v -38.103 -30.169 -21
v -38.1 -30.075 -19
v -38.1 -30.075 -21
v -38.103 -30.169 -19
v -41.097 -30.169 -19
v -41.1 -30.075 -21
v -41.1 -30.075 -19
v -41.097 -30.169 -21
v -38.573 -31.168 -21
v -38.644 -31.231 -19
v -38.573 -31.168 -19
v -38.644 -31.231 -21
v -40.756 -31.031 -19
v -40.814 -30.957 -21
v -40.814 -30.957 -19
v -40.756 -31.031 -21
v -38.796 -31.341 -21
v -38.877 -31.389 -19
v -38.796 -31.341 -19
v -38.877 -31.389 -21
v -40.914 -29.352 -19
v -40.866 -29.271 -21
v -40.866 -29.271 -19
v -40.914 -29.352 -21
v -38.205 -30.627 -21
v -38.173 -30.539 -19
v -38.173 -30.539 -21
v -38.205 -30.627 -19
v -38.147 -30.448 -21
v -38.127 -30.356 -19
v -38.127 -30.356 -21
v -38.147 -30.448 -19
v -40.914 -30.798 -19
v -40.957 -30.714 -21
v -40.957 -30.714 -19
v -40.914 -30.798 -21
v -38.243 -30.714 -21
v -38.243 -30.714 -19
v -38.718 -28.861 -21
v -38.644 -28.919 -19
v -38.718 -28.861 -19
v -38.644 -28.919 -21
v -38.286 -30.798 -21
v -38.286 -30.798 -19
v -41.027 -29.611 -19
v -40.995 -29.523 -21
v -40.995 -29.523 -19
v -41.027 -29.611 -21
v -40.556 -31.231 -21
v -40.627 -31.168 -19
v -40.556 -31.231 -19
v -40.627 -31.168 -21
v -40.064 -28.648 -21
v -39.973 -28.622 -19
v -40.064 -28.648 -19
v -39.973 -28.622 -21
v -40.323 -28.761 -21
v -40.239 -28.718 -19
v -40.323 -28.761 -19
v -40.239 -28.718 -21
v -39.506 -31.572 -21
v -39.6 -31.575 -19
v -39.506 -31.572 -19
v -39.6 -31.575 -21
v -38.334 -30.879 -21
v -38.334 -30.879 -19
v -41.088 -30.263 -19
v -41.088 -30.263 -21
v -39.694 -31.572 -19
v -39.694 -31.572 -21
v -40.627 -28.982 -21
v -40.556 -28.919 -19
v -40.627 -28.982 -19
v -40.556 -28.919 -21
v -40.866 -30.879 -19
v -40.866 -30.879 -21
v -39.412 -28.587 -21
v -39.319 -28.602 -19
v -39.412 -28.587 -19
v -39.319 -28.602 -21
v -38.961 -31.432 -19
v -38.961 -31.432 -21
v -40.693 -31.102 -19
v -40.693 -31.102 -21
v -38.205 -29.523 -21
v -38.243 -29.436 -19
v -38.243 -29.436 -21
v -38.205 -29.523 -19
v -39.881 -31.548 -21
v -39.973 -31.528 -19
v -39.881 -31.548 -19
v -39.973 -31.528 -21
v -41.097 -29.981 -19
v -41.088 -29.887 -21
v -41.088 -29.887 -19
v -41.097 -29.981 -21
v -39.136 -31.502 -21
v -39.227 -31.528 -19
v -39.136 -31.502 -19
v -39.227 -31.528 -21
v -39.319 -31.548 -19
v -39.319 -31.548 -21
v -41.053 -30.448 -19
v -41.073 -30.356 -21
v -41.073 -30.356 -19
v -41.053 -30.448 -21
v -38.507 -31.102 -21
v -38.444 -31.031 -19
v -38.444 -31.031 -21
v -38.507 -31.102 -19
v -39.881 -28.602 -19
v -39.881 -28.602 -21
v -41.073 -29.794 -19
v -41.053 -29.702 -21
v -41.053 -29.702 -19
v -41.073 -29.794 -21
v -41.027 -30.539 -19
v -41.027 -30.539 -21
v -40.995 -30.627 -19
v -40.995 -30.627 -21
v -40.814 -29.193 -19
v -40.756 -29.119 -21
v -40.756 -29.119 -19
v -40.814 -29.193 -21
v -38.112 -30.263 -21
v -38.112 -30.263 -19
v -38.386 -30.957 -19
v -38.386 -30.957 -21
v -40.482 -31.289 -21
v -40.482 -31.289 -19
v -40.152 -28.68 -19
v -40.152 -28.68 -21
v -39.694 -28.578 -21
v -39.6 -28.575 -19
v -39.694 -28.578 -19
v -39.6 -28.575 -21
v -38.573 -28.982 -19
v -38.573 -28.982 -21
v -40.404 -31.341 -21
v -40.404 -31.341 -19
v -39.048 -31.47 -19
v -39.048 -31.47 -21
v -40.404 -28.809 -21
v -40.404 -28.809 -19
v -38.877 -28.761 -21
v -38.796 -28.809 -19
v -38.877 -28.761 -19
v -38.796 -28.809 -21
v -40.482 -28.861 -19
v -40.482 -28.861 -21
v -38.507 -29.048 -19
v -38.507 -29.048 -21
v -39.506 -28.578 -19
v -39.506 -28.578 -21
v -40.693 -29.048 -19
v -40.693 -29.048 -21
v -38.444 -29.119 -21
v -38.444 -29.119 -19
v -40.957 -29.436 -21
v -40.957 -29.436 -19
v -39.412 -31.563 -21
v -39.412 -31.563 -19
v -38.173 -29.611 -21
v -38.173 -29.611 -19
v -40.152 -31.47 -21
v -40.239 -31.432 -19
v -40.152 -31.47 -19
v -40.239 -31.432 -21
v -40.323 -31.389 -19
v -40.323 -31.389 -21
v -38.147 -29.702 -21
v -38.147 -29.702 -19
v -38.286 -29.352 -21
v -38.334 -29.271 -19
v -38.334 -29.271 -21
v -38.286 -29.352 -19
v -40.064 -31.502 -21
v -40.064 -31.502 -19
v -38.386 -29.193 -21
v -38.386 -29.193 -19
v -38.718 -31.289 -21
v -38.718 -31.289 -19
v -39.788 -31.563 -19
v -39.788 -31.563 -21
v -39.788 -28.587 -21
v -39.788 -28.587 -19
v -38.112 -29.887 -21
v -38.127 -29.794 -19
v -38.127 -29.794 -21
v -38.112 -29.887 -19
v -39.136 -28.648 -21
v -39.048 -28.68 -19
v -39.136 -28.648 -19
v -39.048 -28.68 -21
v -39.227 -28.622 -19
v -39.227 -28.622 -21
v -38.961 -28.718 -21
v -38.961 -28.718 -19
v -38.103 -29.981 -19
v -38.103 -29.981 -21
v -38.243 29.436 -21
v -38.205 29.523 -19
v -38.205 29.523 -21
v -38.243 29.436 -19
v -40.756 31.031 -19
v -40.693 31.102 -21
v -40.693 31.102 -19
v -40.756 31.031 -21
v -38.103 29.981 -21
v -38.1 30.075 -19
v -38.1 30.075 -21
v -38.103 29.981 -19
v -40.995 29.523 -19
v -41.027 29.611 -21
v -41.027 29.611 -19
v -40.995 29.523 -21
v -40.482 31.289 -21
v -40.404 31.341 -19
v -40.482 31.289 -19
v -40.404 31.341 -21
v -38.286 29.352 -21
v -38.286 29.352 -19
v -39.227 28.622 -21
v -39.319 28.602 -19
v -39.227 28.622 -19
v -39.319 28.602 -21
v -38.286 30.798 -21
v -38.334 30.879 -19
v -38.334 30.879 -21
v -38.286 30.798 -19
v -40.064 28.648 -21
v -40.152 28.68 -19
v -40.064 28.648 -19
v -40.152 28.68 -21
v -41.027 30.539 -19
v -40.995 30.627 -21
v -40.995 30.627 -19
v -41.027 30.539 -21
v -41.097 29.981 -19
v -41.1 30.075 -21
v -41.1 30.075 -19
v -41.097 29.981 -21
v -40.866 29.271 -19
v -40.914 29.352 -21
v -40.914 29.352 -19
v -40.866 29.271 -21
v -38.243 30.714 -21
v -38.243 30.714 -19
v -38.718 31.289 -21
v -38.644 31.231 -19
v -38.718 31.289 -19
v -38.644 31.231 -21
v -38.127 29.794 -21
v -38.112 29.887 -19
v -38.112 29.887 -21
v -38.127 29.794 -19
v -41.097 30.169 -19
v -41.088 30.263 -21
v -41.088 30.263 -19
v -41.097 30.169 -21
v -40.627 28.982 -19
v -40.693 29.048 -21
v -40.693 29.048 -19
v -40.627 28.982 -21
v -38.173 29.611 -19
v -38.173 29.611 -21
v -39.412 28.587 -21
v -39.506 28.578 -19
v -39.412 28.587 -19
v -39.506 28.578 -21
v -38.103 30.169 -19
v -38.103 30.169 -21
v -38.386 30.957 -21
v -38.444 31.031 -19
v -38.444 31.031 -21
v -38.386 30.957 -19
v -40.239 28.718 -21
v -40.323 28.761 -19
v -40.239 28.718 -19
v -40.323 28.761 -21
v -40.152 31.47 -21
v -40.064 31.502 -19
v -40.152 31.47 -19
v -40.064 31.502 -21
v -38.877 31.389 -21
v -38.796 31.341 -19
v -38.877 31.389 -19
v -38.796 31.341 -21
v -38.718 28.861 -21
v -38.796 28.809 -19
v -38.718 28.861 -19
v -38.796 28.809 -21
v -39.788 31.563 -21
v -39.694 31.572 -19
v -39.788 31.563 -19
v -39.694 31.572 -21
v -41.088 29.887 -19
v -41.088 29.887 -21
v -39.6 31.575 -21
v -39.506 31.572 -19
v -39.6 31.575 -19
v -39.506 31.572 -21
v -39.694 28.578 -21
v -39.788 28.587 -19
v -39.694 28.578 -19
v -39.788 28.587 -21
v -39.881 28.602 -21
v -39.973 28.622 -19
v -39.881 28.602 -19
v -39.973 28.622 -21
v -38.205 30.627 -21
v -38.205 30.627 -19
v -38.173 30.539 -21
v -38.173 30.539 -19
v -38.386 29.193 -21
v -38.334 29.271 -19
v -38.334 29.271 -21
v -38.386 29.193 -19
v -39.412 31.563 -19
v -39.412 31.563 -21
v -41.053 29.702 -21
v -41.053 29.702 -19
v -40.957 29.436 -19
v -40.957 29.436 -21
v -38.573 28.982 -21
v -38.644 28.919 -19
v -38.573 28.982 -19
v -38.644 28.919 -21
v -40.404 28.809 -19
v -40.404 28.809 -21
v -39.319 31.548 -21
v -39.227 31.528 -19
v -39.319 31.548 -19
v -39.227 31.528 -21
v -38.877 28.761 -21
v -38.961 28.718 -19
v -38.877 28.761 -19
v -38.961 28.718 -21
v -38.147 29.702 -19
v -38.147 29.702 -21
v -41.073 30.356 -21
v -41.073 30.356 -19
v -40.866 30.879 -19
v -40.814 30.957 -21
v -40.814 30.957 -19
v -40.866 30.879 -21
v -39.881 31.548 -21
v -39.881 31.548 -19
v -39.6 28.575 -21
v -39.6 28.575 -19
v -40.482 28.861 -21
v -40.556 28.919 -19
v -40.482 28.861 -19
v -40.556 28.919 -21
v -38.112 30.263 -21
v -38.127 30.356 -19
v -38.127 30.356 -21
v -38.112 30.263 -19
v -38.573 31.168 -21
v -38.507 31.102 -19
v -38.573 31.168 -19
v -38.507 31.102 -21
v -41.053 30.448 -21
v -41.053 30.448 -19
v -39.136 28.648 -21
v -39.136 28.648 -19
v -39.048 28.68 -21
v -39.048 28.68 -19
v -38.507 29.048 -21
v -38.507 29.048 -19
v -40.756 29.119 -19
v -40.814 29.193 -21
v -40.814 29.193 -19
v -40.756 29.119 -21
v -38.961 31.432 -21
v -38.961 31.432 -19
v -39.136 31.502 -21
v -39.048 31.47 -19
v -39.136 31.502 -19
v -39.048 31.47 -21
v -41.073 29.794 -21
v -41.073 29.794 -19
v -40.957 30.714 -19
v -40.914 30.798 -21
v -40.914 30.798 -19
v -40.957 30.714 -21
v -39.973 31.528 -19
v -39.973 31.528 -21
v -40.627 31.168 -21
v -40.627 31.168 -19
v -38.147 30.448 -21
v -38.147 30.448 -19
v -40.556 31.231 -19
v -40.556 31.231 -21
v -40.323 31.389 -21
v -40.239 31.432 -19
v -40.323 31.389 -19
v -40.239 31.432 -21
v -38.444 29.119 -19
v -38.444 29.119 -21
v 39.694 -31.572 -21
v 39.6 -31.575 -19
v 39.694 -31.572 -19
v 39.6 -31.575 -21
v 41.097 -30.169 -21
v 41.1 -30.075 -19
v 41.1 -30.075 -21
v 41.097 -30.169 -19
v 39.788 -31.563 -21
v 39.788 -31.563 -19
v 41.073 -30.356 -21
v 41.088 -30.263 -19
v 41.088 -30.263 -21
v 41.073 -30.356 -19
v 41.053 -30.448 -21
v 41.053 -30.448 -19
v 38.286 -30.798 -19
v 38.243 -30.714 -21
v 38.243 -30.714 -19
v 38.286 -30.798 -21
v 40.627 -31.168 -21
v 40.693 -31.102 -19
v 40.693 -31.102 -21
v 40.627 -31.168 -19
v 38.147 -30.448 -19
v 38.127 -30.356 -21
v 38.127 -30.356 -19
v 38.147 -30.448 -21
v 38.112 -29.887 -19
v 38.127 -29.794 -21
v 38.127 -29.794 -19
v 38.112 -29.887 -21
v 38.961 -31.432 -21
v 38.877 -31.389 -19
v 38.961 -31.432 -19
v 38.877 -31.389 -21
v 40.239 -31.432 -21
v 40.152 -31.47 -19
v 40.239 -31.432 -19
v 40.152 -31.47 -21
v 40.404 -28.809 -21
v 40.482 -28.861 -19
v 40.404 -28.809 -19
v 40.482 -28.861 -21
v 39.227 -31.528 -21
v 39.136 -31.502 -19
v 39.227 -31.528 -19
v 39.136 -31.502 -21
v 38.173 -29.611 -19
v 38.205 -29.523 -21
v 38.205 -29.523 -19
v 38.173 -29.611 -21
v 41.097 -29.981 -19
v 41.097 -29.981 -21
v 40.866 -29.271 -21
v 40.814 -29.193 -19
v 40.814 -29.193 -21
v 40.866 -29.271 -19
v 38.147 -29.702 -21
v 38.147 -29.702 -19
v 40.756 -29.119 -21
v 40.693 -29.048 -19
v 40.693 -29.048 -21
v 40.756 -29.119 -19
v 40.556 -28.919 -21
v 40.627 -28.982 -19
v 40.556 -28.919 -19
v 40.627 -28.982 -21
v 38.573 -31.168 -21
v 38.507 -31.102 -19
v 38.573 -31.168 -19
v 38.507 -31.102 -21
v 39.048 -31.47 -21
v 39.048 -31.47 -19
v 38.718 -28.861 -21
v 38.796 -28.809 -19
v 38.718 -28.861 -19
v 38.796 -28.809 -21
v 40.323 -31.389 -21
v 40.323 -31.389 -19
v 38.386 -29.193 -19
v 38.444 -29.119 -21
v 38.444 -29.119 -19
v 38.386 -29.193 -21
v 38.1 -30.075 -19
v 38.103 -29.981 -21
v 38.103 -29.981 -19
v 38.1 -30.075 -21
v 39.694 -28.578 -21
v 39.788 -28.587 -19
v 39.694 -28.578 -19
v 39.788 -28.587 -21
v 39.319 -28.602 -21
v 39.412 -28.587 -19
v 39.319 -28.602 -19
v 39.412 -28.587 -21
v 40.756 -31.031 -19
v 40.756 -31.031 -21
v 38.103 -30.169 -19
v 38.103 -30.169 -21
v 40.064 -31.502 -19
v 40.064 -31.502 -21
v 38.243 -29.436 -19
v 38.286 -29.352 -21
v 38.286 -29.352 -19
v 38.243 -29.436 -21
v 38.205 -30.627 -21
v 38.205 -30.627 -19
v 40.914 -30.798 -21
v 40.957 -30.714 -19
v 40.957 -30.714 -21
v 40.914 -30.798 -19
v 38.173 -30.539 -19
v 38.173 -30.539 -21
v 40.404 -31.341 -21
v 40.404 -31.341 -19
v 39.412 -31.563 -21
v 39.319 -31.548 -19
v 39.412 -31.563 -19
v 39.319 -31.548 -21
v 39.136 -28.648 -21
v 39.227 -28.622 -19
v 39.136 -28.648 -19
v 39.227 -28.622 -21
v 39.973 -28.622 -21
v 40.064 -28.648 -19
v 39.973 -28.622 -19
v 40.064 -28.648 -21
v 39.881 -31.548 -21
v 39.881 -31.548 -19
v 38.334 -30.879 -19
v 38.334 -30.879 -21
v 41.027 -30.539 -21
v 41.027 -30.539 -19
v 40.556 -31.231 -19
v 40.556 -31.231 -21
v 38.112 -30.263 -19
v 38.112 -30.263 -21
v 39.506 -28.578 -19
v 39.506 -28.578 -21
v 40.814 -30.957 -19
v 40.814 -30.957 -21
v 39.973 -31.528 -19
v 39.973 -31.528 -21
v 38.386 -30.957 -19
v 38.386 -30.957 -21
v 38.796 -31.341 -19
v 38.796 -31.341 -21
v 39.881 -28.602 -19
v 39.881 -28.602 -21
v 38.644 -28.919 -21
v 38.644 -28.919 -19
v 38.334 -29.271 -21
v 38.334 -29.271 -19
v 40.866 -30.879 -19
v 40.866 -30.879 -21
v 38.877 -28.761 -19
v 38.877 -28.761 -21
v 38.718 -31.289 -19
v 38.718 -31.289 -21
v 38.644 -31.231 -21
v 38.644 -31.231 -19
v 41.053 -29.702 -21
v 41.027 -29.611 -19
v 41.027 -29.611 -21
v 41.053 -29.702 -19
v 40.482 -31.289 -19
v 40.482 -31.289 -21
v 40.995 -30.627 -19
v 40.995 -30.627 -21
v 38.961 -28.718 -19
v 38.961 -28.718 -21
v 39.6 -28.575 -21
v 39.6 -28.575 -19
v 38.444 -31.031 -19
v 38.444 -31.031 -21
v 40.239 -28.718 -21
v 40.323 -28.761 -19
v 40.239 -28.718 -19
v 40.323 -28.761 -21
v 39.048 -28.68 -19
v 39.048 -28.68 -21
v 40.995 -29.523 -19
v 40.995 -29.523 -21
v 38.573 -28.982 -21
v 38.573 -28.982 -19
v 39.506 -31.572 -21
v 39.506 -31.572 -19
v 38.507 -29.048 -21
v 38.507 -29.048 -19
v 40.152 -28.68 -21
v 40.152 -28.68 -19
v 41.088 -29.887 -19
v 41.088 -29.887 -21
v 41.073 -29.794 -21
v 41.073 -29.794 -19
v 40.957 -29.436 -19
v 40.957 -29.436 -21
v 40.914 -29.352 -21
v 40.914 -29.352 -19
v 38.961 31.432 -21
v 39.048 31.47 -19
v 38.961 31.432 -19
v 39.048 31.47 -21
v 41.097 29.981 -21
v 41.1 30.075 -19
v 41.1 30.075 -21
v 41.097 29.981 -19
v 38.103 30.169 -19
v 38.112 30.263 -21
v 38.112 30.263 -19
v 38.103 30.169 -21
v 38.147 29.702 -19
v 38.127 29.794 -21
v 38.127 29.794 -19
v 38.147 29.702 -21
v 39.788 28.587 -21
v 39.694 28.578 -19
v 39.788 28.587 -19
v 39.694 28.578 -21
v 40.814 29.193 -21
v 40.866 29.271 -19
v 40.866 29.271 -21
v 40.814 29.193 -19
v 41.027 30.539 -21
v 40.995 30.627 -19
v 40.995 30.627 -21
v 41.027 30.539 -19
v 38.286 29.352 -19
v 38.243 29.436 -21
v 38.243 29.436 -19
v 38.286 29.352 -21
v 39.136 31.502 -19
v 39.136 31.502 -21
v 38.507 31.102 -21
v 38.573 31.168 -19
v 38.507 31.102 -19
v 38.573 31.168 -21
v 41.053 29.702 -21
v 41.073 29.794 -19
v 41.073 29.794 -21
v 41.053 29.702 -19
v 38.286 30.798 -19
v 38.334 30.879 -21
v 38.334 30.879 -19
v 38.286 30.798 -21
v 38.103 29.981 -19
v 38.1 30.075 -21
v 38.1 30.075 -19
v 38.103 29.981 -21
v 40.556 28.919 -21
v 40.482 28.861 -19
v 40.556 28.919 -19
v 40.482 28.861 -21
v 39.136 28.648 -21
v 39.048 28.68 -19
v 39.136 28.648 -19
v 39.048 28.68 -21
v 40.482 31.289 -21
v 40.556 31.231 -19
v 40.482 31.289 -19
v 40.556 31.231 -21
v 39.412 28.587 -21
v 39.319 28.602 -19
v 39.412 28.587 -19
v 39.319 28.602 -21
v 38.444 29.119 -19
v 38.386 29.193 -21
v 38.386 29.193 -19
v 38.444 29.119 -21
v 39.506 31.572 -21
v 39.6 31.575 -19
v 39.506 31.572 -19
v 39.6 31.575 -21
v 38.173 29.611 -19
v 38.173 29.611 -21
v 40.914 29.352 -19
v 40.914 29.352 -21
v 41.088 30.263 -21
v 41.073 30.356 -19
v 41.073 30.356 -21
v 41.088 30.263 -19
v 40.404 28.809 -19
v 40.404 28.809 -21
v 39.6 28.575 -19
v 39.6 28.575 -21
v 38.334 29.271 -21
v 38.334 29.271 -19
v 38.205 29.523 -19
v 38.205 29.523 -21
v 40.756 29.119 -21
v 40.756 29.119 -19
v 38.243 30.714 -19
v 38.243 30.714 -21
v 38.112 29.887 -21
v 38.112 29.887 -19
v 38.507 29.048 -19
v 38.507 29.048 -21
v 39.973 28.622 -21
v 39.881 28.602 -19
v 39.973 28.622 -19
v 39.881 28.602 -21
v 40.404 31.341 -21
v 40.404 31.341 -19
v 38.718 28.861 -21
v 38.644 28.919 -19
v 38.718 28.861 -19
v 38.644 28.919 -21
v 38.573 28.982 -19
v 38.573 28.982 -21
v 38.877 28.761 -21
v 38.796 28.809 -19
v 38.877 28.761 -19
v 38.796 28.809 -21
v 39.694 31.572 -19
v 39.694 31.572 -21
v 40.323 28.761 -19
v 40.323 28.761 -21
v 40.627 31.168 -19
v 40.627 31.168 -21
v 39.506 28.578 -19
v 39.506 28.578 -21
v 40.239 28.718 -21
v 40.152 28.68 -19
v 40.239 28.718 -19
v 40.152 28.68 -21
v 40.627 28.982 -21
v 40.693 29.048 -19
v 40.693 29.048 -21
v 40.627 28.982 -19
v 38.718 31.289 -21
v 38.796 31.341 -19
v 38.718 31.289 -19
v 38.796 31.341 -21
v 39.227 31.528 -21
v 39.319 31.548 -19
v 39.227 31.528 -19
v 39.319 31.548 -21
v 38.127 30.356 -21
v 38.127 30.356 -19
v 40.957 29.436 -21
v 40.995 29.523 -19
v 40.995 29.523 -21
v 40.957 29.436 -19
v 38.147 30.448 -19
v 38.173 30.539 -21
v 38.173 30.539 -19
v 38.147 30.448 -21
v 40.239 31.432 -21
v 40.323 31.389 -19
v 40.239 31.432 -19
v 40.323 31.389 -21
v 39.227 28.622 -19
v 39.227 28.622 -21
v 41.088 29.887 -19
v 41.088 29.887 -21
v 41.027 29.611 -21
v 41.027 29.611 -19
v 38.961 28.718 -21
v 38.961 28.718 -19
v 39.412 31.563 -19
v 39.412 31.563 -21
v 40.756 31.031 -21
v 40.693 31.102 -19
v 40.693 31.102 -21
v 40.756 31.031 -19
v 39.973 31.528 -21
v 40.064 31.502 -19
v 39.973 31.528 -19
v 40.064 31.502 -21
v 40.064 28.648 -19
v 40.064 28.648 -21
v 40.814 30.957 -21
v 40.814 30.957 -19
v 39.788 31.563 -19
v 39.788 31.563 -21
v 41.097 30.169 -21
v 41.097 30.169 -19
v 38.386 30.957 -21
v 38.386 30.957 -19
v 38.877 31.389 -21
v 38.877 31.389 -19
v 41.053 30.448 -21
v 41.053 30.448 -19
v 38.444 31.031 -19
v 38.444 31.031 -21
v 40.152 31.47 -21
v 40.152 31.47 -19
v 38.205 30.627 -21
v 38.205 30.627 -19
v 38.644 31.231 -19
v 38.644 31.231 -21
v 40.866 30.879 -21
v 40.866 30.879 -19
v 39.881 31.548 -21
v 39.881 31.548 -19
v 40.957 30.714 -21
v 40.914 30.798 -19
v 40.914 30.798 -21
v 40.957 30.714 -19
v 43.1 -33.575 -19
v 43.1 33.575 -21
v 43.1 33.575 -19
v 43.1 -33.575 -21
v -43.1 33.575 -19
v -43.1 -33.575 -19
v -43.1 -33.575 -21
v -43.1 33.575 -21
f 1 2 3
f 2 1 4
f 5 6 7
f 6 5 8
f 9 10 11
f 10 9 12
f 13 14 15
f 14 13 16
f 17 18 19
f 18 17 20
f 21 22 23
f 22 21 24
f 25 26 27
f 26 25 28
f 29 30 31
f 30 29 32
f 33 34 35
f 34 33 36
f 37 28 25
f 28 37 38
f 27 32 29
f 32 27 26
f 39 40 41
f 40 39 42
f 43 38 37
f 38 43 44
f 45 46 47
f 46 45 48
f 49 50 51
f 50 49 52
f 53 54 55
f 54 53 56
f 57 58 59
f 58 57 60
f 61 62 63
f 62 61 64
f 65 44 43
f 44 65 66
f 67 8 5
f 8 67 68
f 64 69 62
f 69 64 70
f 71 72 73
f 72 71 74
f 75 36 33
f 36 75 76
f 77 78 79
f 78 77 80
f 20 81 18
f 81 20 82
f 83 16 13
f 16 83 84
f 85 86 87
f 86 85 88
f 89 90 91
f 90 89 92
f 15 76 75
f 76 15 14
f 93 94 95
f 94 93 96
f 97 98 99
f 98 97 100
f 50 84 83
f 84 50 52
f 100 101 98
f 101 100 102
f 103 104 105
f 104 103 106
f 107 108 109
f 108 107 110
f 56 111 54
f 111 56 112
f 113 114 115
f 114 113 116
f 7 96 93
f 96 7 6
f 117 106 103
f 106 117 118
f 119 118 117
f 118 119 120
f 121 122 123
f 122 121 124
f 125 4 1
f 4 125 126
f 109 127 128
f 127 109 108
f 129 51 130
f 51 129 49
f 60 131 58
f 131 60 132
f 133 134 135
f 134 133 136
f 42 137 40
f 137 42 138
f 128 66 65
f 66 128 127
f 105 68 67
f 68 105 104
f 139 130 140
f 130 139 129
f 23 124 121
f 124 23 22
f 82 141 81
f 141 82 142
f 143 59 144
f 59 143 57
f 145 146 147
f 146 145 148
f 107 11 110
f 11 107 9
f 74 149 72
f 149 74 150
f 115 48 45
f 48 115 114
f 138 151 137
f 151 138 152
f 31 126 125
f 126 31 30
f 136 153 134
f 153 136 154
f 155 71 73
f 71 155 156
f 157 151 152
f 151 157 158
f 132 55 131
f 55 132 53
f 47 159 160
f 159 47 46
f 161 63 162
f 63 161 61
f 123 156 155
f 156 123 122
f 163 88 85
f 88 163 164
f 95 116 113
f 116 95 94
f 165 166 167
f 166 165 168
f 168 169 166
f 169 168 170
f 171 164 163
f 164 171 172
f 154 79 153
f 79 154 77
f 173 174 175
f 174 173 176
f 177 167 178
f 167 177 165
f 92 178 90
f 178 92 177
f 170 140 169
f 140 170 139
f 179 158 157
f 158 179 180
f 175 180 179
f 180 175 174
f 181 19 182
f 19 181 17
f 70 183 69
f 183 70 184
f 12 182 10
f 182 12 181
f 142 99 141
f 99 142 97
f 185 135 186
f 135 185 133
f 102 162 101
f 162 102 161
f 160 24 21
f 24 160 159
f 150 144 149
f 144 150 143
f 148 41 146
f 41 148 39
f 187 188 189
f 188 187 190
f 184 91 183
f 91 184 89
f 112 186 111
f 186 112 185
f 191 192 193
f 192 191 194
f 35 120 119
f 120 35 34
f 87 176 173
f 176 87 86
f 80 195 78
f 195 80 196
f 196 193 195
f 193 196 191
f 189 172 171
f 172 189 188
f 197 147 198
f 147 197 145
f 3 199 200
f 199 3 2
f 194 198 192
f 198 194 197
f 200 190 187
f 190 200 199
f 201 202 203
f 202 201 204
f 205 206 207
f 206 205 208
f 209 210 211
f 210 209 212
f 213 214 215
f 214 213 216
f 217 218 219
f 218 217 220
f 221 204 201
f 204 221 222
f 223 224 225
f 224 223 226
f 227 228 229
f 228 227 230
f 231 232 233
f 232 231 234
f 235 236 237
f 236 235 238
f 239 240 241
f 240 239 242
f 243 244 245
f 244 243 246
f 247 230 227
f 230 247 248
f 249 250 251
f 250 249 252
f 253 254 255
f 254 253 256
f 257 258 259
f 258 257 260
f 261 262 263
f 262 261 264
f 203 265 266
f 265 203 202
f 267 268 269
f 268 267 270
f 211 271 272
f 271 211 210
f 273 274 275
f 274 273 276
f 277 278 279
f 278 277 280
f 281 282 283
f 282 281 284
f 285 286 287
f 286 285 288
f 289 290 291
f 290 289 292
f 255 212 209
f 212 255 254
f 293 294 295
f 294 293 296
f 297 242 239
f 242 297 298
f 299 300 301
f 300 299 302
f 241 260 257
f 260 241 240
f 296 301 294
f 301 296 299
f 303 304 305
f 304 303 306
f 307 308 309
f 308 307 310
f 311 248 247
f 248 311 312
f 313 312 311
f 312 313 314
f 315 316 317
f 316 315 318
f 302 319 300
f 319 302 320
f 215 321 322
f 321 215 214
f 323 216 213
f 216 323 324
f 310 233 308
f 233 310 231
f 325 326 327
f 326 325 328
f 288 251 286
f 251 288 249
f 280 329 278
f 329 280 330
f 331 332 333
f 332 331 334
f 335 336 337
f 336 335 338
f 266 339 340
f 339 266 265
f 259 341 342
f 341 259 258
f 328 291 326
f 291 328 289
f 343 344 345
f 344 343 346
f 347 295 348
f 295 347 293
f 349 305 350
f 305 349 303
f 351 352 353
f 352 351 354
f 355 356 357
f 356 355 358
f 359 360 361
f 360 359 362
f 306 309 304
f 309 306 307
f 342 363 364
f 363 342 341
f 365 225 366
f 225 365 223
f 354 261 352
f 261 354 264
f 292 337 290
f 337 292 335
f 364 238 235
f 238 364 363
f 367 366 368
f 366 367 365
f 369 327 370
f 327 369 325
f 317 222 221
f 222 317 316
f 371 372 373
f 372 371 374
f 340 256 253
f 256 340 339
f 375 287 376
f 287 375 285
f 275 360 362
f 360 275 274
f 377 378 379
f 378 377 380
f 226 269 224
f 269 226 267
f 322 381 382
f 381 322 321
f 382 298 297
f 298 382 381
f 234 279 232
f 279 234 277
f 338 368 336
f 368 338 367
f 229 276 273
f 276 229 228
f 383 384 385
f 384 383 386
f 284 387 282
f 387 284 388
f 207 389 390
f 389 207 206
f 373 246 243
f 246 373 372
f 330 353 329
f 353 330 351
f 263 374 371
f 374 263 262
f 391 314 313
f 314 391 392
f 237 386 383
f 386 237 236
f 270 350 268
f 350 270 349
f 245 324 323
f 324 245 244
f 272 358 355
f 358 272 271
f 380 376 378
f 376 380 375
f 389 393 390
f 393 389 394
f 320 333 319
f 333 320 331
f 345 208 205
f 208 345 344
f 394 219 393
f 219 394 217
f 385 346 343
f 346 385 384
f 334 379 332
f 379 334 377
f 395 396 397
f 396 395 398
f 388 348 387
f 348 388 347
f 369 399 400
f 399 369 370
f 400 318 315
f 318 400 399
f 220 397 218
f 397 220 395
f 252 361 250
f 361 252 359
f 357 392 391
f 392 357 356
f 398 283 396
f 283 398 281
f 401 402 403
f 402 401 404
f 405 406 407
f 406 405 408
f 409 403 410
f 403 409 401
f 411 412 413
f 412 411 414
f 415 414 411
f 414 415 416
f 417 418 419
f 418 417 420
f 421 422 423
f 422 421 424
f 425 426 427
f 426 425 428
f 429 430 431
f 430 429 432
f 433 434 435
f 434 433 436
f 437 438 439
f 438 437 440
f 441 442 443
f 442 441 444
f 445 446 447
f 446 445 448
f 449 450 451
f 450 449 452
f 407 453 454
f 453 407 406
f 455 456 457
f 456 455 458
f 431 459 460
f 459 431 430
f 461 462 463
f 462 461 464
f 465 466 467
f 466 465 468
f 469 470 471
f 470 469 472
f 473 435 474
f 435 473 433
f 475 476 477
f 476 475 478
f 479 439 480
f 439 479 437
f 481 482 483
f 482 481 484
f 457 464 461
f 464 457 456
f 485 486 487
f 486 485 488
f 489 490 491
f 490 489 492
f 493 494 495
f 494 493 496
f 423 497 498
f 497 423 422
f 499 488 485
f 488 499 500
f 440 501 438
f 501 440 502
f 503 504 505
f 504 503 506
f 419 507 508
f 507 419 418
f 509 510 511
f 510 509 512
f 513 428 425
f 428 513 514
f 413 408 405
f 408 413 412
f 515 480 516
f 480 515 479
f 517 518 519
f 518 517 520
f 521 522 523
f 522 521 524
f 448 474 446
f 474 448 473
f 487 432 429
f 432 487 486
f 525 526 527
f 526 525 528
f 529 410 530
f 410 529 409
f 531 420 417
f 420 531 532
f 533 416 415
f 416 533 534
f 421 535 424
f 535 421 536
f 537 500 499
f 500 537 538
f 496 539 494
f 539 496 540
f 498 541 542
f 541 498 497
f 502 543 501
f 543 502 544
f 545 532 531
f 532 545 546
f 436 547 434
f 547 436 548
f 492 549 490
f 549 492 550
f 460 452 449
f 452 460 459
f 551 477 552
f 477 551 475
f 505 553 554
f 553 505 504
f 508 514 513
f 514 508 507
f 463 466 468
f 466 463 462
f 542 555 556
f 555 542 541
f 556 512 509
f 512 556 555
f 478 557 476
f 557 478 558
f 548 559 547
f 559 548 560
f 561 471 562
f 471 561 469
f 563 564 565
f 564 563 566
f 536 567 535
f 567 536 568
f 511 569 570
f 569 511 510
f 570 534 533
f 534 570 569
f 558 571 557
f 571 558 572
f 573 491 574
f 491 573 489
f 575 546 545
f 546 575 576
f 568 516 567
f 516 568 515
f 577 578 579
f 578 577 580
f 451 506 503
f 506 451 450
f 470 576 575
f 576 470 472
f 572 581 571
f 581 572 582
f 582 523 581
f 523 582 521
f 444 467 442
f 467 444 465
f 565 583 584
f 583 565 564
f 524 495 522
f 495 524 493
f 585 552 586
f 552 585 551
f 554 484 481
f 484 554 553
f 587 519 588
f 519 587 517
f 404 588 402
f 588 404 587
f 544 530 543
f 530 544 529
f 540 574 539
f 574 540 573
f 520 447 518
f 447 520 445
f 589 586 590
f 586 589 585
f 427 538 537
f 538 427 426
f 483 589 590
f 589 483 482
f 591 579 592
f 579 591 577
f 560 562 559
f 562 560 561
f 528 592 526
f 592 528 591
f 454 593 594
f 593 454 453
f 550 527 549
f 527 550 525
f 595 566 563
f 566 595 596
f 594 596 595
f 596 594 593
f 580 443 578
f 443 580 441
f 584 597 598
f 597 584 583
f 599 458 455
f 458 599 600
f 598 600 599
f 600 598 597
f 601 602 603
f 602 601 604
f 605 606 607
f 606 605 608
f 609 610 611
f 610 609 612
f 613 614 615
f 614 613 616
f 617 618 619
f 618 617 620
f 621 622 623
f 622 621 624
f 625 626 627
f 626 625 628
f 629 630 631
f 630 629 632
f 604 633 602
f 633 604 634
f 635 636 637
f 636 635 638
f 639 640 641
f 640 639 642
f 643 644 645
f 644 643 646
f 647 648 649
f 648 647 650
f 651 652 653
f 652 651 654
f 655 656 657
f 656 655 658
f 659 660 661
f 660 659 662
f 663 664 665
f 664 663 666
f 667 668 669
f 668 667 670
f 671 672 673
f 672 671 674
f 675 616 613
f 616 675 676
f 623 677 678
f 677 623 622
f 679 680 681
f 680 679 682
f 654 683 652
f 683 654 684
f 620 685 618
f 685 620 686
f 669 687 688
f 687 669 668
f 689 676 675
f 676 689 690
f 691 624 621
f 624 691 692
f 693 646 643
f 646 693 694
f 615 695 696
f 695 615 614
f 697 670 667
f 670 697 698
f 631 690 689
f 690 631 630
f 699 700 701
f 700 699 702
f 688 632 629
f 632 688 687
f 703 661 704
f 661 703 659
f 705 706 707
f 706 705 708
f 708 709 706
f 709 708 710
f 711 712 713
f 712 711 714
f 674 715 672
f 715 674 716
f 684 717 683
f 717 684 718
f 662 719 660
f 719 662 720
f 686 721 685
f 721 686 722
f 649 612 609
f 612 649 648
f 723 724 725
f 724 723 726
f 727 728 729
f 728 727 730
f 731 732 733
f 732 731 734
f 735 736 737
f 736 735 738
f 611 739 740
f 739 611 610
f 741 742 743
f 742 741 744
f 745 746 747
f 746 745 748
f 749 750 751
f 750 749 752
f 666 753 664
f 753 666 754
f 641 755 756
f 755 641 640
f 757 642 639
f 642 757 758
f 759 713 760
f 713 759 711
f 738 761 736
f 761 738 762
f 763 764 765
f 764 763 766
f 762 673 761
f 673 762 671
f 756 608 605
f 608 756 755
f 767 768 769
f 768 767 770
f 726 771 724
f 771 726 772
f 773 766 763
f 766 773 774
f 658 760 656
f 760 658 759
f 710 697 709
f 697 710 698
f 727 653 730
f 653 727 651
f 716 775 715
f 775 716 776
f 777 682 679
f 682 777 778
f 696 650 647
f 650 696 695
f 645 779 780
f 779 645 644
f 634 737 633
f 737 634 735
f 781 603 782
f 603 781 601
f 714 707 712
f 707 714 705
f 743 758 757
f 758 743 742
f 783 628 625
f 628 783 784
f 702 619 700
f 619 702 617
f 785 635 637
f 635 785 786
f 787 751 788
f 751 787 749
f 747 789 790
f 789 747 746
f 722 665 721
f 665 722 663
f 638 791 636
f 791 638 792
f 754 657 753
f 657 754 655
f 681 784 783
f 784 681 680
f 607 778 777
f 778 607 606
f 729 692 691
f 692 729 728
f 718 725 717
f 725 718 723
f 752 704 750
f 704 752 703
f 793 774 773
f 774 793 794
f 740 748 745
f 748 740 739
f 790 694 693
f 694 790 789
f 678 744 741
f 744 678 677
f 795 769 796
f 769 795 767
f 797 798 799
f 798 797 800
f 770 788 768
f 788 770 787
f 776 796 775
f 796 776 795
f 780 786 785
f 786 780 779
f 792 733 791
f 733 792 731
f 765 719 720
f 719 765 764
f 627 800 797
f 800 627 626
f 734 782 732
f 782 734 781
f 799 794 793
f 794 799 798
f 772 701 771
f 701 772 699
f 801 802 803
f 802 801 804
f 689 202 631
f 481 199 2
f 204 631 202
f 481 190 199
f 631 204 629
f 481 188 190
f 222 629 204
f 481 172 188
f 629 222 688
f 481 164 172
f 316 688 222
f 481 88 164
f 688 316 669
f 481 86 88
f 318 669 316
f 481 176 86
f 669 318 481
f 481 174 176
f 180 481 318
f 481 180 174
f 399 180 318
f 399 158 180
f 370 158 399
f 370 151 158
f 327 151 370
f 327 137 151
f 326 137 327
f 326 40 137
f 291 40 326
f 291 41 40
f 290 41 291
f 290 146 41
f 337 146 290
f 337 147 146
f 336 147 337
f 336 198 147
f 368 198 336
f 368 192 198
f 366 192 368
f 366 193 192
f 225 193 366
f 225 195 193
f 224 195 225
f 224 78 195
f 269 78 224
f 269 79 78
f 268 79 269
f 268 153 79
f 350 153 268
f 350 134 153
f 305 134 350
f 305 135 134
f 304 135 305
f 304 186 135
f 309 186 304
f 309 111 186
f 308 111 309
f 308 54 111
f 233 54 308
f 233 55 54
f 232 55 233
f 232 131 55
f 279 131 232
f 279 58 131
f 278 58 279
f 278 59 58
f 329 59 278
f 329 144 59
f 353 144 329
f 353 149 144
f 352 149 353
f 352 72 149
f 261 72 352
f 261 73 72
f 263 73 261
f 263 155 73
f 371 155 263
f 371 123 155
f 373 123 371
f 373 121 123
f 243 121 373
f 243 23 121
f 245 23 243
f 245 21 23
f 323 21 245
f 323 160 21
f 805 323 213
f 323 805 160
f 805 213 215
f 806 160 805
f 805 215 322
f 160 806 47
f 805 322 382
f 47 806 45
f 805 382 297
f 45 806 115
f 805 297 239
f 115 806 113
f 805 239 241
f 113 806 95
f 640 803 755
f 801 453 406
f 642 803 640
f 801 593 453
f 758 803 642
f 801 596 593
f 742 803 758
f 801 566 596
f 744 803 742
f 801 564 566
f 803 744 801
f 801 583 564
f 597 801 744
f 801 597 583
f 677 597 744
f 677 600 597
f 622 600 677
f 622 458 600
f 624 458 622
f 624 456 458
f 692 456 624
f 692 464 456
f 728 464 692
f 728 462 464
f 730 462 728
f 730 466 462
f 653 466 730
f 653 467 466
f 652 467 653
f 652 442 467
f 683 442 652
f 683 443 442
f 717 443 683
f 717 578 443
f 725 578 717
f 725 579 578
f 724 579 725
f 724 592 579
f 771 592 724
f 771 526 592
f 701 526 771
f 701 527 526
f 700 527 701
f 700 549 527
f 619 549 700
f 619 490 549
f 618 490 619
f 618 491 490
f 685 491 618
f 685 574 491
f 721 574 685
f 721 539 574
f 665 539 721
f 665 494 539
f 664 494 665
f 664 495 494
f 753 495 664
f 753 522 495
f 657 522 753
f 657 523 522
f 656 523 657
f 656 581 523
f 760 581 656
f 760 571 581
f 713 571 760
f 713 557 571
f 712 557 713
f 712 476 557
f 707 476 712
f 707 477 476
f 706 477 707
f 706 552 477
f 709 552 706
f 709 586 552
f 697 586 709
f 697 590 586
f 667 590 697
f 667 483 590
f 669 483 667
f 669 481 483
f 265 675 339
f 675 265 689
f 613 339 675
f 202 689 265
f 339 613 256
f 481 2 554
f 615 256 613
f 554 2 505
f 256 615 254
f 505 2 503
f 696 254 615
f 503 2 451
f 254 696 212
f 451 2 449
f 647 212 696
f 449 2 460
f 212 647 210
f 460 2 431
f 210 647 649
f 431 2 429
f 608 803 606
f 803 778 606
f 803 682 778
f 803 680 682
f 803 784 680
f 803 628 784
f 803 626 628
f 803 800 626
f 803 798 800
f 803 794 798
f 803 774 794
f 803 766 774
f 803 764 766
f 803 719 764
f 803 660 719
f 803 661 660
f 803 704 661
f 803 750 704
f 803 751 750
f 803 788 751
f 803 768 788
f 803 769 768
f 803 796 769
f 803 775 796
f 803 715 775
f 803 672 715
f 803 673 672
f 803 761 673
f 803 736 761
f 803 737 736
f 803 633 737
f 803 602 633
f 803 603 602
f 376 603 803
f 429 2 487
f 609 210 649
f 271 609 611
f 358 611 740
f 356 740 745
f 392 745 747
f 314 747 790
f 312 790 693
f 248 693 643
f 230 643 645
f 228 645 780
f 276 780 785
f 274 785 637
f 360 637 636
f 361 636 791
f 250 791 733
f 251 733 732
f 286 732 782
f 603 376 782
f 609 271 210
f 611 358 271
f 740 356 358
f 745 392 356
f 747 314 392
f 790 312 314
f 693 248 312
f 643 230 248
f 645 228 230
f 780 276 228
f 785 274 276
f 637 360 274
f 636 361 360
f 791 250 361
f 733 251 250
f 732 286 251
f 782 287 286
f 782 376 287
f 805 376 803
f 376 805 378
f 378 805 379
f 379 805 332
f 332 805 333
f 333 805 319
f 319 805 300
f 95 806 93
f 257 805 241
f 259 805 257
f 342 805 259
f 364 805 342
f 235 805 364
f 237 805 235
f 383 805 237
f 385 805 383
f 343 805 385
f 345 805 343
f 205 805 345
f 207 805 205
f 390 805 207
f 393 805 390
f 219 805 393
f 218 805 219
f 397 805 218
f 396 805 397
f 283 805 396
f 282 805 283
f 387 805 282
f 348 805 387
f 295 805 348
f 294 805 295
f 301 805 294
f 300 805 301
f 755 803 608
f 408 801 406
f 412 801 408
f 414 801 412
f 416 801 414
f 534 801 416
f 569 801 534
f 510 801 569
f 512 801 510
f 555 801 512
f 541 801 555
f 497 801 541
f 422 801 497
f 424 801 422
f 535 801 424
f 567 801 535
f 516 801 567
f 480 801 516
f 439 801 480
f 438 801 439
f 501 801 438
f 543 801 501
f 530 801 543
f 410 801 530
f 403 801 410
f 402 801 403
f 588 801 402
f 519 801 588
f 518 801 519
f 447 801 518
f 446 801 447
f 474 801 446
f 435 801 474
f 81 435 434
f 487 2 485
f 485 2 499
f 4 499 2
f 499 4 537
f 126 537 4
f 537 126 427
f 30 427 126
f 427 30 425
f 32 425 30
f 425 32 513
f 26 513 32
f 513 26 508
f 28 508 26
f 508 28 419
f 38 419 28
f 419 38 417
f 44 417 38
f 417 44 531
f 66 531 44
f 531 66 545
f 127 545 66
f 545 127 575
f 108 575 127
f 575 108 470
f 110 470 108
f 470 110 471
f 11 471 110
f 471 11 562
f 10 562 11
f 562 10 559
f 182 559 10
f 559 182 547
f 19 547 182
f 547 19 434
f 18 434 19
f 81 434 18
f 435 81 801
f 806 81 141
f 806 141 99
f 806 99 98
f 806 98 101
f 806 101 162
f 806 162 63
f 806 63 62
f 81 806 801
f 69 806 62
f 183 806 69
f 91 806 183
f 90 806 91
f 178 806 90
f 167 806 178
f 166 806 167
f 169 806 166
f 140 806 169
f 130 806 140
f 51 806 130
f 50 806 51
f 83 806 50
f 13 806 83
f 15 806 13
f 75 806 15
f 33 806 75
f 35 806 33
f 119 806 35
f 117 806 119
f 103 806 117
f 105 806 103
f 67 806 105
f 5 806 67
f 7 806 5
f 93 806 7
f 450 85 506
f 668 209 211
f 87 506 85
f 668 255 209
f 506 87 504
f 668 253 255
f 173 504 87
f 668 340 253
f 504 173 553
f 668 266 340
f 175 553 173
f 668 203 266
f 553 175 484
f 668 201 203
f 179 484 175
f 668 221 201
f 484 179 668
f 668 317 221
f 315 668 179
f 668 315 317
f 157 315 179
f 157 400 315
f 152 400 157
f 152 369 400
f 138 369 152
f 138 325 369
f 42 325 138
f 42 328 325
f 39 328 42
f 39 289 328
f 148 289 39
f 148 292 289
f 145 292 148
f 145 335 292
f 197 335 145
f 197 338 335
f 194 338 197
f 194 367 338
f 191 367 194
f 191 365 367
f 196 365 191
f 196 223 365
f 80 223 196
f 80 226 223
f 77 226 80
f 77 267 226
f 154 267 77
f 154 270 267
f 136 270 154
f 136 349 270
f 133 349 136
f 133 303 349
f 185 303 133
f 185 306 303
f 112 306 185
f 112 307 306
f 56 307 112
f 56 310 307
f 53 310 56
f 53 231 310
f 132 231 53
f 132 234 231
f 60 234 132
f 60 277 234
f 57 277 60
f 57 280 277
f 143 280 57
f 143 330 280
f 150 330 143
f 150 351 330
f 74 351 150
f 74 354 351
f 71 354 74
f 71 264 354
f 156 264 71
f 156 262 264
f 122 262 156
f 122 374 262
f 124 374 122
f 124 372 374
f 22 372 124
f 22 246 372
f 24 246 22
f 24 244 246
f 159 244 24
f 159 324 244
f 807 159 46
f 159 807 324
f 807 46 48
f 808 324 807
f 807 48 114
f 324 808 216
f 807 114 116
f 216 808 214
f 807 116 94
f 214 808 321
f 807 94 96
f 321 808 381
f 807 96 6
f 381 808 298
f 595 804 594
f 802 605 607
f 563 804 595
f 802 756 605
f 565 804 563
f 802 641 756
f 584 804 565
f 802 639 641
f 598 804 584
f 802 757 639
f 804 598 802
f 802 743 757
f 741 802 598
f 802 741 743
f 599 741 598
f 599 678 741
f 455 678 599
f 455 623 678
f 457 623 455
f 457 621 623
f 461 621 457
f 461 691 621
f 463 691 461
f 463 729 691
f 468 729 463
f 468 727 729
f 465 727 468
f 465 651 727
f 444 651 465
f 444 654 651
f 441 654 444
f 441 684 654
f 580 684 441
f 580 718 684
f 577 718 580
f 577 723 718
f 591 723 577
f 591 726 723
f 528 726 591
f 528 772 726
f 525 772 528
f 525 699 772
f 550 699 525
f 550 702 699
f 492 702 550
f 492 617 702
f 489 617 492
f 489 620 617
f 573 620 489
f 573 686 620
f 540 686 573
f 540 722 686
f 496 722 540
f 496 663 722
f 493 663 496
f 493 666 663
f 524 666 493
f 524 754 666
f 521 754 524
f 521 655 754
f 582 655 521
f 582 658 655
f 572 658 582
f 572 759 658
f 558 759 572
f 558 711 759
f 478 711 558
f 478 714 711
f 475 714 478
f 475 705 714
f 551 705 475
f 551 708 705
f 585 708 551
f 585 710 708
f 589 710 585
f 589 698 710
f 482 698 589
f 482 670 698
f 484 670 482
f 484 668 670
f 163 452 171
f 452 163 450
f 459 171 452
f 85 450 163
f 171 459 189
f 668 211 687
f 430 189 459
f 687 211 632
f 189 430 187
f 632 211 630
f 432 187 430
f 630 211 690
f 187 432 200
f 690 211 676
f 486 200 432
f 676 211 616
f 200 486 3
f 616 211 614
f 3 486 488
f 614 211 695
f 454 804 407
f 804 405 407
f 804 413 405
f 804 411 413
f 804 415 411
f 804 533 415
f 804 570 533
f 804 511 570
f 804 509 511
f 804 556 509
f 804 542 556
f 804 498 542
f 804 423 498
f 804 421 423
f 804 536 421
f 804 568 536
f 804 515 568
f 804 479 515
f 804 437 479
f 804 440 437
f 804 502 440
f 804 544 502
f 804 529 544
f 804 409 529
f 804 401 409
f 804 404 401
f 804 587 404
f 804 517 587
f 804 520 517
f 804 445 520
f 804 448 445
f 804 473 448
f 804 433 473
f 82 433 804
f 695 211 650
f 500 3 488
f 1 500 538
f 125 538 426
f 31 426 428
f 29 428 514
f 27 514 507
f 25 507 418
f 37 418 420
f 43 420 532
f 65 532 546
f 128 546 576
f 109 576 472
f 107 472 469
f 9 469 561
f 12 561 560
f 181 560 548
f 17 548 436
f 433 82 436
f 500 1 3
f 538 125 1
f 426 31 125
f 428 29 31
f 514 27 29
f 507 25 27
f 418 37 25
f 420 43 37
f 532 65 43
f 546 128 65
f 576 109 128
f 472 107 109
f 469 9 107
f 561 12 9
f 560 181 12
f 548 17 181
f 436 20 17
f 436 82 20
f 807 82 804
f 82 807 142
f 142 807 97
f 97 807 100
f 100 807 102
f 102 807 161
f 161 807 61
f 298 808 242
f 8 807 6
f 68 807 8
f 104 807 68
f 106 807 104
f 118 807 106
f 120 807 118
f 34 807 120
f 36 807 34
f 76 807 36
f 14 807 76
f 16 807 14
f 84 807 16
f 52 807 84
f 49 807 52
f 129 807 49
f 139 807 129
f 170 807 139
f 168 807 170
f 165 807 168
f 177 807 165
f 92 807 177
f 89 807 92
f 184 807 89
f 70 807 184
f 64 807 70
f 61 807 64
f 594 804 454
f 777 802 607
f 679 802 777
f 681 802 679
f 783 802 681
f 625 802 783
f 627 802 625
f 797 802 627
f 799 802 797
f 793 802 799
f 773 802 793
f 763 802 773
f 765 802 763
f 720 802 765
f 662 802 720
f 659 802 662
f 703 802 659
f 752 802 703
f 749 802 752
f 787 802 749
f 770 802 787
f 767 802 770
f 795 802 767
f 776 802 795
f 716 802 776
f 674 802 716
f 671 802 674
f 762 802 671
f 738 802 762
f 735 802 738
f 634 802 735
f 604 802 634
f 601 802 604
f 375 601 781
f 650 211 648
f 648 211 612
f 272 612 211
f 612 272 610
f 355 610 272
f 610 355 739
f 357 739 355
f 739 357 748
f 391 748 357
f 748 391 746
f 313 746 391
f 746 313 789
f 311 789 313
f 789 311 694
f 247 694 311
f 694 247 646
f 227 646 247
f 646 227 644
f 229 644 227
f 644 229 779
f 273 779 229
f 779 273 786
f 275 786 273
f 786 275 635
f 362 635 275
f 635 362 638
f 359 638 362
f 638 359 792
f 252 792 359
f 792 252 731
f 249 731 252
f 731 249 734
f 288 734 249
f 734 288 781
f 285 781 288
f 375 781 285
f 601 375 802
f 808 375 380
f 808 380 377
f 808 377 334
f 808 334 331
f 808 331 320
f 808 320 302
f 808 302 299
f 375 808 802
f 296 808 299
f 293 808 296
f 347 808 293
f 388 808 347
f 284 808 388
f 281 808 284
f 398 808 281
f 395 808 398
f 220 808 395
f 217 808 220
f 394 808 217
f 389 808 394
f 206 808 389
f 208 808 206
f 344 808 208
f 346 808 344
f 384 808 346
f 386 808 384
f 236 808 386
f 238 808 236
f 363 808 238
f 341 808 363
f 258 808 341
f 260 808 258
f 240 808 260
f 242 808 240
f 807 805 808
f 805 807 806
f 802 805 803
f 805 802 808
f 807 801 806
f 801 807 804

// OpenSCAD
// file: cherry_mx_switch_cutouts.scad
// https://cdn.sparkfun.com/datasheets/Components/Switches/MX%20Series.pdf

$cherry_mx_switch_width=19.05;

// The pcb cutouts are defined on a grid with 0.05 inch spacing,
// which in metric is 1.27mm. The holes are described by diameter
// on the datasheet.
module cherry_mx_pcb_cutout(pins=true, led=true, diode=true) {
    module gridpos(x, y) {
        translate([1.27*x, 1.27*y, 0])
        children();
    }

    module hole(d) {
        circle(d/2, $fn=100);
    }

    gridpos( 0, 0) hole(4);
    gridpos(-3, 2) hole(1.5);
    gridpos( 2, 4) hole(1.5);

    if (pins) {
        gridpos(-4, 0) hole(1.7);
        gridpos( 4, 0) hole(1.7);
    }

    if (led) {
        gridpos(-1, -4) hole(1);
        gridpos( 1, -4) hole(1);
    }

    if (led) {
        gridpos(-3, -4) hole(1);
        gridpos( 3, -4) hole(1);
    }
}

module cherry_mx_plate_cutout() {
    square([14, 14], center=true);
}

module cherry_mx_switch_cutout(u, height) {
    difference() {
        cube([u*$cherry_mx_switch_width, $cherry_mx_switch_width, height], center=true);

        linear_extrude(height*2, center=true)
        children();
    }
}

module cherry_switch_pcb(u, height) {
    cherry_mx_switch_cutout(u, height)
    cherry_mx_pcb_cutout();
}

module cherry_switch_plate(u, height) {
    difference() {
        cube([u*$cherry_mx_switch_width, $cherry_mx_switch_width, height], center=true);
        
        linear_extrude(height*2, center=true)
        cherry_mx_plate_cutout();
    }
}
// main file
include <cherry_mx_switch_cutouts.scad>

num_switches_x = 4;
num_switches_y = 3;

plate_width = $cherry_mx_switch_width*num_switches_x + 10;
plate_length = $cherry_mx_switch_width*num_switches_y + 10;
plate_depth = 5;

case_width = plate_width + 8;
case_length = plate_length + 8;
case_depth = 18.5 + 10;

module plate() {

    difference() {
        cube([plate_width, plate_length, plate_depth], center=true);

        for (x = [-(num_switches_x/2 - 0.5) : (num_switches_x/2 - 0.5)]) {
            for (y = [-(num_switches_y/2 - 0.5) : (num_switches_y/2 - 0.5)])  {
                translate([x*$cherry_mx_switch_width, y*$cherry_mx_switch_width, 0])
                linear_extrude(plate_depth*2, center=true)
                cherry_mx_plate_cutout();
            }
        }
        
        for (x = [-1, 1]) {
            for (y = [-1, 1]) {
                translate([x*plate_width/2 + x*-3.5, y*plate_length/2 - y*3.5, 0])
                linear_extrude(plate_depth*2, center=true)
                circle(1.6, $fn=100);
            }
        }
    }
}

module body() {
    difference() {
        cube([case_width, case_length, case_depth], center=true);
        
        translate([0, 0, (case_depth - 15.2)/2])
        cube([plate_width+0.4, plate_length+0.4, 15.201], center=true);
        
        cube([plate_width-14, plate_length+0.4, case_depth*2], center=true);

        cube([plate_width+0.4, plate_length-14, case_depth*2], center=true);

        for (x = [-1, 1]) {
            for (y = [-1, 1]) {
                translate([x*plate_width/2 + x*-3.5, y*plate_length/2 - y*3.5, 0])
                linear_extrude(case_depth*2, center=true)
                circle(1.5, $fn=100);
            }
        }
        
        translate([case_width/2, 0, -(case_depth-15.2)/2])
        cube([8, 10, 3.5], center=true);
        
        translate([(case_width-2)/2-2.001, 0, -(case_depth-15.2+3.5+1.499)/2])
        cube([2, 18, 1.5], center=true);
    }
    
    translate([(case_width-22)/2-3.8, 0, -(case_depth-4.5)/2])
    cube([22, 10, 4.5], center=true);
    
    translate([(case_width)/2-24.8, 0, -(case_depth-4.5-4.5)/2])
    cube([2, 10, 4.5], center=true);
}

module bottom() {
    difference() {
        cube([plate_width, plate_length, 2], center=true);

        for (x = [-1, 1]) {
            for (y = [-1, 1]) {
                translate([x*plate_width/2 + x*-3.5, y*plate_length/2 - y*3.5, 0])
                linear_extrude(case_depth*2, center=true)
                circle(1.5, $fn=100);
            }
        }
    }
}

//translate([0, 0, 20]) plate();

//body();

translate([0, 0, -20]) bottom();
